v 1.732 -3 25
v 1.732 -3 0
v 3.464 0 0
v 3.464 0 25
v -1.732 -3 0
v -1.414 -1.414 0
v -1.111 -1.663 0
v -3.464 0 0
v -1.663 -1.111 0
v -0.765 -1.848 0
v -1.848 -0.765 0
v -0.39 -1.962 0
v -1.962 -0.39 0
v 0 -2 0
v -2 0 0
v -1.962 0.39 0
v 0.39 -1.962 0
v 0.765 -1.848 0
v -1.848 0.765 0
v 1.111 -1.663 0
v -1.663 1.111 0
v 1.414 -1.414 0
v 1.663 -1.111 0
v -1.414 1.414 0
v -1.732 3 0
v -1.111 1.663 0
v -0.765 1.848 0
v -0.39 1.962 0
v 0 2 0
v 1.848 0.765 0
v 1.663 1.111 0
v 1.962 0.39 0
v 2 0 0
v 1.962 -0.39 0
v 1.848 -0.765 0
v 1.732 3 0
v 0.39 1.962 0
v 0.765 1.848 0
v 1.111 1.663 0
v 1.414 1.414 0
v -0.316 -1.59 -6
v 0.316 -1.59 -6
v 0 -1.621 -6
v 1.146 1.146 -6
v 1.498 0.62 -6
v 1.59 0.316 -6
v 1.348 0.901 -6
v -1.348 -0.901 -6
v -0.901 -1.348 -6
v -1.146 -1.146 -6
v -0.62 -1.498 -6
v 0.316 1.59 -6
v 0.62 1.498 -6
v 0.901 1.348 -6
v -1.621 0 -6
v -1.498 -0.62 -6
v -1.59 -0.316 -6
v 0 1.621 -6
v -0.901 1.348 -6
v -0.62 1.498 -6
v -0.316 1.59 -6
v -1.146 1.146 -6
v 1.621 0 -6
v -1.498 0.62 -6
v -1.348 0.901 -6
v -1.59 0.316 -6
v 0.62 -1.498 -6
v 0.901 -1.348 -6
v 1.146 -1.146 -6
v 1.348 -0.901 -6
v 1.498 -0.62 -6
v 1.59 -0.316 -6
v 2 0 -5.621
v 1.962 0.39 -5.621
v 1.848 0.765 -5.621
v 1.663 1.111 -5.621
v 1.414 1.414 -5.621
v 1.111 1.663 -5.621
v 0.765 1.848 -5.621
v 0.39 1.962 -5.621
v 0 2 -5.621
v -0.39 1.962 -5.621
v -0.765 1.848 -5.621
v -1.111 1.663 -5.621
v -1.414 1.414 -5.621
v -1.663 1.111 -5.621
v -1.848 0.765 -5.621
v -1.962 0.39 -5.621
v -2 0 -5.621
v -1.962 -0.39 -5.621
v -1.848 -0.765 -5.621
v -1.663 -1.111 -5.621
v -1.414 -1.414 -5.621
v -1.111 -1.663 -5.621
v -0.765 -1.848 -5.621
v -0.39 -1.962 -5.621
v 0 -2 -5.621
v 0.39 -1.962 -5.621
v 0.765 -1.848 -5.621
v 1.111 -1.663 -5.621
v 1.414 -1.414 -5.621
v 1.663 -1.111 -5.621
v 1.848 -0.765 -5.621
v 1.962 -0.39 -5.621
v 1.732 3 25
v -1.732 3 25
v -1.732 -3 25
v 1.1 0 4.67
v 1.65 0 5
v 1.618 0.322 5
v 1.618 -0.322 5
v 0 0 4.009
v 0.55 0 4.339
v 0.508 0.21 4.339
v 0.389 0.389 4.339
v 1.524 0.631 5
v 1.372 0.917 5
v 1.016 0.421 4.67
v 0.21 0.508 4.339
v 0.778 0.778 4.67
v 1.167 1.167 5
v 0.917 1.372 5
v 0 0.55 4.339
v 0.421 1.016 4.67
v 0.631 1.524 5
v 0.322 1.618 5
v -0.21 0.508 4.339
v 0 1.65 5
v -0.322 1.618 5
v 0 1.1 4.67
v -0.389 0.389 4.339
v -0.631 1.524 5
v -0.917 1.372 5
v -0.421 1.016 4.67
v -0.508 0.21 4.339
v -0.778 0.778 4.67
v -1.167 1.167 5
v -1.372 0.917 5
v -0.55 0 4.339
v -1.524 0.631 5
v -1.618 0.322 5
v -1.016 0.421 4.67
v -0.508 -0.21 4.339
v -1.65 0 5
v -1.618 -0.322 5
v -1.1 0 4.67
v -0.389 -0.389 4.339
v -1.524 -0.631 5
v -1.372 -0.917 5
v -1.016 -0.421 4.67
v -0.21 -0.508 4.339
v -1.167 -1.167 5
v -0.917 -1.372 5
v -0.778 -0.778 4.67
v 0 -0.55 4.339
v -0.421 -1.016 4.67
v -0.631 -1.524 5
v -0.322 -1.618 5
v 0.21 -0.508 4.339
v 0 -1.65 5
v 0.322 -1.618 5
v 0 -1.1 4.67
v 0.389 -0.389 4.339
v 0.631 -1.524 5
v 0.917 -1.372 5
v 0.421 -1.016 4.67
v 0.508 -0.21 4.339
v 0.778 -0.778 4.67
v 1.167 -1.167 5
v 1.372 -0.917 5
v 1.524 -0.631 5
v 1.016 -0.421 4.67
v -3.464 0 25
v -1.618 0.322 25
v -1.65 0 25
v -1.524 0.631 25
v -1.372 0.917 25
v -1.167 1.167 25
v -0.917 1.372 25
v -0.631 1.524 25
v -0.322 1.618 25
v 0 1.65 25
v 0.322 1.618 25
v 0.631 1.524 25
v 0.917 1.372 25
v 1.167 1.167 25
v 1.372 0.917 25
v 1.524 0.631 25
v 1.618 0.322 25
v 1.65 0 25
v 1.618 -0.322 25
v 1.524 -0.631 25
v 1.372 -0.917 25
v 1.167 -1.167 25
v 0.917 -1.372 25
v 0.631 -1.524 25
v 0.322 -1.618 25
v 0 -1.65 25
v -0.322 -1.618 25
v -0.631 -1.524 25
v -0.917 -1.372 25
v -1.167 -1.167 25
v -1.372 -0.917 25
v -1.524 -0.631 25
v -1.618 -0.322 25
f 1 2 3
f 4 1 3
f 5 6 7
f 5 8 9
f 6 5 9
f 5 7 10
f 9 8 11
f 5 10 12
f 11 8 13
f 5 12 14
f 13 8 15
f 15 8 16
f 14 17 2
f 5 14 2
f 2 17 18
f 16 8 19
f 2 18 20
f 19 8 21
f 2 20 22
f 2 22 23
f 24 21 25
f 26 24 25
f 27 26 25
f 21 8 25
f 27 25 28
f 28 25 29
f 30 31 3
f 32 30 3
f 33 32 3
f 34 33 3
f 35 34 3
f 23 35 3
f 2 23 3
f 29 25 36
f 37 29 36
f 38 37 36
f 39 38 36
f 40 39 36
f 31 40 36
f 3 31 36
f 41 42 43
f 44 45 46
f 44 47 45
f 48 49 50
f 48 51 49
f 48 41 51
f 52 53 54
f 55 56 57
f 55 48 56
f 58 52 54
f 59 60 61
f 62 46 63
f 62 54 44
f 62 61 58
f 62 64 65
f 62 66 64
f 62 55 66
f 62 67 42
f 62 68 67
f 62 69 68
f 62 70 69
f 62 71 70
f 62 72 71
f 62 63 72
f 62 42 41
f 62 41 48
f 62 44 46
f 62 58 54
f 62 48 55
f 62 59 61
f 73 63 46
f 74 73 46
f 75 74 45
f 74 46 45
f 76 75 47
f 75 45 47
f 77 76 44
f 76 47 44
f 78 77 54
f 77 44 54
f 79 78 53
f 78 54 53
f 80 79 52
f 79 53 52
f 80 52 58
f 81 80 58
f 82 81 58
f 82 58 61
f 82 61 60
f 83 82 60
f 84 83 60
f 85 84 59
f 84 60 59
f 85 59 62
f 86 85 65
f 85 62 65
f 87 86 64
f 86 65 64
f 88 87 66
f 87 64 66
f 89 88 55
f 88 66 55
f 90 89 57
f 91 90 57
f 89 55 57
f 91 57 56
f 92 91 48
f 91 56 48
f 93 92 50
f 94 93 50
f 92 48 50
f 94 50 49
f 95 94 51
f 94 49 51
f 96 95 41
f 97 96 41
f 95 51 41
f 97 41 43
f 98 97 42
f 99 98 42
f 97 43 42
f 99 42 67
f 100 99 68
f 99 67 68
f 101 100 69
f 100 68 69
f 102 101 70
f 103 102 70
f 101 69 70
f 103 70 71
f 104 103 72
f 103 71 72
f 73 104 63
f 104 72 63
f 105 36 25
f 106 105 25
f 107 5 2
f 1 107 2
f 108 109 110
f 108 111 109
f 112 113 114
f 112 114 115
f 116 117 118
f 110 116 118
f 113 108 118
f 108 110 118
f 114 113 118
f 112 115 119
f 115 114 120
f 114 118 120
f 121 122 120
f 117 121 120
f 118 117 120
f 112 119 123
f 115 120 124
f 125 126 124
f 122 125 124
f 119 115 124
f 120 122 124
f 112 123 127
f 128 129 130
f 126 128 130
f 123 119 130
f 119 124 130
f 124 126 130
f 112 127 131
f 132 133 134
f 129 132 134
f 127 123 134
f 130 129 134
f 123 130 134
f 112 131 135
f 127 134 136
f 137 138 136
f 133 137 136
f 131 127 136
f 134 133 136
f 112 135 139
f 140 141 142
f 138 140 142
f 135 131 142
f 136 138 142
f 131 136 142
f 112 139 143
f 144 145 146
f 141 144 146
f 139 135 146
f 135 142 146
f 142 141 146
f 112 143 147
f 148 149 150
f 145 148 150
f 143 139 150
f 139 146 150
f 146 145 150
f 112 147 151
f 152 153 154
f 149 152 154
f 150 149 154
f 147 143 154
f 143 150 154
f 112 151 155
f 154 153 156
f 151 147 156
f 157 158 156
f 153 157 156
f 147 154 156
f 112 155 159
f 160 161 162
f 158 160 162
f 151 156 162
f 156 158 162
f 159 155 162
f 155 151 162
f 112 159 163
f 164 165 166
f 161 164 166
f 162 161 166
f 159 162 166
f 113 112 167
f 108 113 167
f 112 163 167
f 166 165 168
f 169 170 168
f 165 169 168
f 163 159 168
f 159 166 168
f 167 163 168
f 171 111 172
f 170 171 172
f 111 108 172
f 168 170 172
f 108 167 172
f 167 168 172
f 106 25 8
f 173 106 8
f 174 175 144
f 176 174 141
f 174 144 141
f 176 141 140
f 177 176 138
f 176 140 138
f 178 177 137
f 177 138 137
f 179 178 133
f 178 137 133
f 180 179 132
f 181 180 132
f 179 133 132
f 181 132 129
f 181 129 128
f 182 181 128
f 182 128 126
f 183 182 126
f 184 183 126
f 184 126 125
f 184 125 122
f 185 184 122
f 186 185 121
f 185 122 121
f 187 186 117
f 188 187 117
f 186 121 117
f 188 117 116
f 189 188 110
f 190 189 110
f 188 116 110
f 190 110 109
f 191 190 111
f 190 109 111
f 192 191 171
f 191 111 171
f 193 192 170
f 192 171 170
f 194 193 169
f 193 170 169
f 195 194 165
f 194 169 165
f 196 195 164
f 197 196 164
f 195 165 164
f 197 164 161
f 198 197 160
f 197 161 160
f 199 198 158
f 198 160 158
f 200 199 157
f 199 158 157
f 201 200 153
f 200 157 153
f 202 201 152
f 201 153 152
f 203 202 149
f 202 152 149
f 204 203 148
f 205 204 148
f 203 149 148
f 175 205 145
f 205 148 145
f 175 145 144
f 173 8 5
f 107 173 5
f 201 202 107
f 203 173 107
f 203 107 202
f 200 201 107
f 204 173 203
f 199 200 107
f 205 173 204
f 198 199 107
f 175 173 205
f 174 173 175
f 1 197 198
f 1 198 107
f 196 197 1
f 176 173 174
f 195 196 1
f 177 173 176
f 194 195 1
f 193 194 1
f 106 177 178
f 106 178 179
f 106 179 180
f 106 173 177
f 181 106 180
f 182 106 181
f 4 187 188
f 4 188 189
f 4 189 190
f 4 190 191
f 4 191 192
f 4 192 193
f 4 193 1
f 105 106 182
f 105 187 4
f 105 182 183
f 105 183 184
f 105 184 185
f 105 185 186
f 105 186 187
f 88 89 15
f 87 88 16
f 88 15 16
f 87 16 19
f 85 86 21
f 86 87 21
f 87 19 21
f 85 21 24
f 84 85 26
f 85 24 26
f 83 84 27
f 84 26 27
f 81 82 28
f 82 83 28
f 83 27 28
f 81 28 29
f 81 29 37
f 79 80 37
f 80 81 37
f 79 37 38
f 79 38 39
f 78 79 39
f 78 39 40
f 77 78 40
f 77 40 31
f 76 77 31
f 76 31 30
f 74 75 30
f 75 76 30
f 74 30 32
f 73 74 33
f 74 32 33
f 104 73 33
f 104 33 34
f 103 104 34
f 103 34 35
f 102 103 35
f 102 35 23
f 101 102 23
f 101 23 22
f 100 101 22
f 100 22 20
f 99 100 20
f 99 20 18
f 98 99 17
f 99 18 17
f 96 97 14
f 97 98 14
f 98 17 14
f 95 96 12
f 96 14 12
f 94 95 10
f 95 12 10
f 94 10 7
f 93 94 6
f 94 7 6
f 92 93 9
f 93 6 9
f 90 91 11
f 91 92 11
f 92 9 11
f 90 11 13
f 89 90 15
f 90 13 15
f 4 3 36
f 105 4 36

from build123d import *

# Parameters (mm, degrees)
EXTRUDE_1_DEPTH        = 25
HOLE_WIZARD_M4_1_D     = 3.3
HOLE_WIZARD_M4_1_DEPTH = 20
HOLE_WIZARD_M4_1_TIP   = 0.991420021
SKETCH_5_R             = 2
EXTRUDE_2_DEPTH        = 6


# Read off the part's stored shape, not the designer's step: M4 机械螺纹 螺柱1
with BuildPart() as part:
    # 草图1 → 凸台-拉伸1 (new body)
    with BuildSketch(Plane.XY):
        Polygon((-3.464101615, 0), (-1.732050808, -3), (1.732050808, -3), (3.464101615, 0), (1.732050808, 3), (-1.732050808, 3), align=None)
    extrude(amount=EXTRUDE_1_DEPTH)

    # M4 螺纹孔1
    with Locations(Plane.XY.offset(25)):
        with Locations((0, 0)):
            Hole(HOLE_WIZARD_M4_1_D / 2, depth=HOLE_WIZARD_M4_1_DEPTH)
            with Locations((0, 0, -(HOLE_WIZARD_M4_1_DEPTH + HOLE_WIZARD_M4_1_TIP / 2))):  # 118° drill point
                Cone(0, HOLE_WIZARD_M4_1_D / 2, HOLE_WIZARD_M4_1_TIP, mode=Mode.SUBTRACT)

    # 草图5 → 凸台-拉伸2 (add)
    with BuildSketch(Plane(origin=(0, 0, 0), x_dir=(-1, 0, 0), z_dir=(0, 0, -1))):
        Circle(SKETCH_5_R)
    extrude(amount=EXTRUDE_2_DEPTH)

    # M4 机械螺纹 螺柱1 outline → M4 机械螺纹 螺柱1 (revolve, cut)
    with BuildSketch(Plane.XZ):
        Polygon((2, -5.621), (1.621, -6), (2, -6), align=None)
    revolve(axis=Axis((0, 0, 0), (0, 0, 1)), mode=Mode.SUBTRACT)


solid = part.part
